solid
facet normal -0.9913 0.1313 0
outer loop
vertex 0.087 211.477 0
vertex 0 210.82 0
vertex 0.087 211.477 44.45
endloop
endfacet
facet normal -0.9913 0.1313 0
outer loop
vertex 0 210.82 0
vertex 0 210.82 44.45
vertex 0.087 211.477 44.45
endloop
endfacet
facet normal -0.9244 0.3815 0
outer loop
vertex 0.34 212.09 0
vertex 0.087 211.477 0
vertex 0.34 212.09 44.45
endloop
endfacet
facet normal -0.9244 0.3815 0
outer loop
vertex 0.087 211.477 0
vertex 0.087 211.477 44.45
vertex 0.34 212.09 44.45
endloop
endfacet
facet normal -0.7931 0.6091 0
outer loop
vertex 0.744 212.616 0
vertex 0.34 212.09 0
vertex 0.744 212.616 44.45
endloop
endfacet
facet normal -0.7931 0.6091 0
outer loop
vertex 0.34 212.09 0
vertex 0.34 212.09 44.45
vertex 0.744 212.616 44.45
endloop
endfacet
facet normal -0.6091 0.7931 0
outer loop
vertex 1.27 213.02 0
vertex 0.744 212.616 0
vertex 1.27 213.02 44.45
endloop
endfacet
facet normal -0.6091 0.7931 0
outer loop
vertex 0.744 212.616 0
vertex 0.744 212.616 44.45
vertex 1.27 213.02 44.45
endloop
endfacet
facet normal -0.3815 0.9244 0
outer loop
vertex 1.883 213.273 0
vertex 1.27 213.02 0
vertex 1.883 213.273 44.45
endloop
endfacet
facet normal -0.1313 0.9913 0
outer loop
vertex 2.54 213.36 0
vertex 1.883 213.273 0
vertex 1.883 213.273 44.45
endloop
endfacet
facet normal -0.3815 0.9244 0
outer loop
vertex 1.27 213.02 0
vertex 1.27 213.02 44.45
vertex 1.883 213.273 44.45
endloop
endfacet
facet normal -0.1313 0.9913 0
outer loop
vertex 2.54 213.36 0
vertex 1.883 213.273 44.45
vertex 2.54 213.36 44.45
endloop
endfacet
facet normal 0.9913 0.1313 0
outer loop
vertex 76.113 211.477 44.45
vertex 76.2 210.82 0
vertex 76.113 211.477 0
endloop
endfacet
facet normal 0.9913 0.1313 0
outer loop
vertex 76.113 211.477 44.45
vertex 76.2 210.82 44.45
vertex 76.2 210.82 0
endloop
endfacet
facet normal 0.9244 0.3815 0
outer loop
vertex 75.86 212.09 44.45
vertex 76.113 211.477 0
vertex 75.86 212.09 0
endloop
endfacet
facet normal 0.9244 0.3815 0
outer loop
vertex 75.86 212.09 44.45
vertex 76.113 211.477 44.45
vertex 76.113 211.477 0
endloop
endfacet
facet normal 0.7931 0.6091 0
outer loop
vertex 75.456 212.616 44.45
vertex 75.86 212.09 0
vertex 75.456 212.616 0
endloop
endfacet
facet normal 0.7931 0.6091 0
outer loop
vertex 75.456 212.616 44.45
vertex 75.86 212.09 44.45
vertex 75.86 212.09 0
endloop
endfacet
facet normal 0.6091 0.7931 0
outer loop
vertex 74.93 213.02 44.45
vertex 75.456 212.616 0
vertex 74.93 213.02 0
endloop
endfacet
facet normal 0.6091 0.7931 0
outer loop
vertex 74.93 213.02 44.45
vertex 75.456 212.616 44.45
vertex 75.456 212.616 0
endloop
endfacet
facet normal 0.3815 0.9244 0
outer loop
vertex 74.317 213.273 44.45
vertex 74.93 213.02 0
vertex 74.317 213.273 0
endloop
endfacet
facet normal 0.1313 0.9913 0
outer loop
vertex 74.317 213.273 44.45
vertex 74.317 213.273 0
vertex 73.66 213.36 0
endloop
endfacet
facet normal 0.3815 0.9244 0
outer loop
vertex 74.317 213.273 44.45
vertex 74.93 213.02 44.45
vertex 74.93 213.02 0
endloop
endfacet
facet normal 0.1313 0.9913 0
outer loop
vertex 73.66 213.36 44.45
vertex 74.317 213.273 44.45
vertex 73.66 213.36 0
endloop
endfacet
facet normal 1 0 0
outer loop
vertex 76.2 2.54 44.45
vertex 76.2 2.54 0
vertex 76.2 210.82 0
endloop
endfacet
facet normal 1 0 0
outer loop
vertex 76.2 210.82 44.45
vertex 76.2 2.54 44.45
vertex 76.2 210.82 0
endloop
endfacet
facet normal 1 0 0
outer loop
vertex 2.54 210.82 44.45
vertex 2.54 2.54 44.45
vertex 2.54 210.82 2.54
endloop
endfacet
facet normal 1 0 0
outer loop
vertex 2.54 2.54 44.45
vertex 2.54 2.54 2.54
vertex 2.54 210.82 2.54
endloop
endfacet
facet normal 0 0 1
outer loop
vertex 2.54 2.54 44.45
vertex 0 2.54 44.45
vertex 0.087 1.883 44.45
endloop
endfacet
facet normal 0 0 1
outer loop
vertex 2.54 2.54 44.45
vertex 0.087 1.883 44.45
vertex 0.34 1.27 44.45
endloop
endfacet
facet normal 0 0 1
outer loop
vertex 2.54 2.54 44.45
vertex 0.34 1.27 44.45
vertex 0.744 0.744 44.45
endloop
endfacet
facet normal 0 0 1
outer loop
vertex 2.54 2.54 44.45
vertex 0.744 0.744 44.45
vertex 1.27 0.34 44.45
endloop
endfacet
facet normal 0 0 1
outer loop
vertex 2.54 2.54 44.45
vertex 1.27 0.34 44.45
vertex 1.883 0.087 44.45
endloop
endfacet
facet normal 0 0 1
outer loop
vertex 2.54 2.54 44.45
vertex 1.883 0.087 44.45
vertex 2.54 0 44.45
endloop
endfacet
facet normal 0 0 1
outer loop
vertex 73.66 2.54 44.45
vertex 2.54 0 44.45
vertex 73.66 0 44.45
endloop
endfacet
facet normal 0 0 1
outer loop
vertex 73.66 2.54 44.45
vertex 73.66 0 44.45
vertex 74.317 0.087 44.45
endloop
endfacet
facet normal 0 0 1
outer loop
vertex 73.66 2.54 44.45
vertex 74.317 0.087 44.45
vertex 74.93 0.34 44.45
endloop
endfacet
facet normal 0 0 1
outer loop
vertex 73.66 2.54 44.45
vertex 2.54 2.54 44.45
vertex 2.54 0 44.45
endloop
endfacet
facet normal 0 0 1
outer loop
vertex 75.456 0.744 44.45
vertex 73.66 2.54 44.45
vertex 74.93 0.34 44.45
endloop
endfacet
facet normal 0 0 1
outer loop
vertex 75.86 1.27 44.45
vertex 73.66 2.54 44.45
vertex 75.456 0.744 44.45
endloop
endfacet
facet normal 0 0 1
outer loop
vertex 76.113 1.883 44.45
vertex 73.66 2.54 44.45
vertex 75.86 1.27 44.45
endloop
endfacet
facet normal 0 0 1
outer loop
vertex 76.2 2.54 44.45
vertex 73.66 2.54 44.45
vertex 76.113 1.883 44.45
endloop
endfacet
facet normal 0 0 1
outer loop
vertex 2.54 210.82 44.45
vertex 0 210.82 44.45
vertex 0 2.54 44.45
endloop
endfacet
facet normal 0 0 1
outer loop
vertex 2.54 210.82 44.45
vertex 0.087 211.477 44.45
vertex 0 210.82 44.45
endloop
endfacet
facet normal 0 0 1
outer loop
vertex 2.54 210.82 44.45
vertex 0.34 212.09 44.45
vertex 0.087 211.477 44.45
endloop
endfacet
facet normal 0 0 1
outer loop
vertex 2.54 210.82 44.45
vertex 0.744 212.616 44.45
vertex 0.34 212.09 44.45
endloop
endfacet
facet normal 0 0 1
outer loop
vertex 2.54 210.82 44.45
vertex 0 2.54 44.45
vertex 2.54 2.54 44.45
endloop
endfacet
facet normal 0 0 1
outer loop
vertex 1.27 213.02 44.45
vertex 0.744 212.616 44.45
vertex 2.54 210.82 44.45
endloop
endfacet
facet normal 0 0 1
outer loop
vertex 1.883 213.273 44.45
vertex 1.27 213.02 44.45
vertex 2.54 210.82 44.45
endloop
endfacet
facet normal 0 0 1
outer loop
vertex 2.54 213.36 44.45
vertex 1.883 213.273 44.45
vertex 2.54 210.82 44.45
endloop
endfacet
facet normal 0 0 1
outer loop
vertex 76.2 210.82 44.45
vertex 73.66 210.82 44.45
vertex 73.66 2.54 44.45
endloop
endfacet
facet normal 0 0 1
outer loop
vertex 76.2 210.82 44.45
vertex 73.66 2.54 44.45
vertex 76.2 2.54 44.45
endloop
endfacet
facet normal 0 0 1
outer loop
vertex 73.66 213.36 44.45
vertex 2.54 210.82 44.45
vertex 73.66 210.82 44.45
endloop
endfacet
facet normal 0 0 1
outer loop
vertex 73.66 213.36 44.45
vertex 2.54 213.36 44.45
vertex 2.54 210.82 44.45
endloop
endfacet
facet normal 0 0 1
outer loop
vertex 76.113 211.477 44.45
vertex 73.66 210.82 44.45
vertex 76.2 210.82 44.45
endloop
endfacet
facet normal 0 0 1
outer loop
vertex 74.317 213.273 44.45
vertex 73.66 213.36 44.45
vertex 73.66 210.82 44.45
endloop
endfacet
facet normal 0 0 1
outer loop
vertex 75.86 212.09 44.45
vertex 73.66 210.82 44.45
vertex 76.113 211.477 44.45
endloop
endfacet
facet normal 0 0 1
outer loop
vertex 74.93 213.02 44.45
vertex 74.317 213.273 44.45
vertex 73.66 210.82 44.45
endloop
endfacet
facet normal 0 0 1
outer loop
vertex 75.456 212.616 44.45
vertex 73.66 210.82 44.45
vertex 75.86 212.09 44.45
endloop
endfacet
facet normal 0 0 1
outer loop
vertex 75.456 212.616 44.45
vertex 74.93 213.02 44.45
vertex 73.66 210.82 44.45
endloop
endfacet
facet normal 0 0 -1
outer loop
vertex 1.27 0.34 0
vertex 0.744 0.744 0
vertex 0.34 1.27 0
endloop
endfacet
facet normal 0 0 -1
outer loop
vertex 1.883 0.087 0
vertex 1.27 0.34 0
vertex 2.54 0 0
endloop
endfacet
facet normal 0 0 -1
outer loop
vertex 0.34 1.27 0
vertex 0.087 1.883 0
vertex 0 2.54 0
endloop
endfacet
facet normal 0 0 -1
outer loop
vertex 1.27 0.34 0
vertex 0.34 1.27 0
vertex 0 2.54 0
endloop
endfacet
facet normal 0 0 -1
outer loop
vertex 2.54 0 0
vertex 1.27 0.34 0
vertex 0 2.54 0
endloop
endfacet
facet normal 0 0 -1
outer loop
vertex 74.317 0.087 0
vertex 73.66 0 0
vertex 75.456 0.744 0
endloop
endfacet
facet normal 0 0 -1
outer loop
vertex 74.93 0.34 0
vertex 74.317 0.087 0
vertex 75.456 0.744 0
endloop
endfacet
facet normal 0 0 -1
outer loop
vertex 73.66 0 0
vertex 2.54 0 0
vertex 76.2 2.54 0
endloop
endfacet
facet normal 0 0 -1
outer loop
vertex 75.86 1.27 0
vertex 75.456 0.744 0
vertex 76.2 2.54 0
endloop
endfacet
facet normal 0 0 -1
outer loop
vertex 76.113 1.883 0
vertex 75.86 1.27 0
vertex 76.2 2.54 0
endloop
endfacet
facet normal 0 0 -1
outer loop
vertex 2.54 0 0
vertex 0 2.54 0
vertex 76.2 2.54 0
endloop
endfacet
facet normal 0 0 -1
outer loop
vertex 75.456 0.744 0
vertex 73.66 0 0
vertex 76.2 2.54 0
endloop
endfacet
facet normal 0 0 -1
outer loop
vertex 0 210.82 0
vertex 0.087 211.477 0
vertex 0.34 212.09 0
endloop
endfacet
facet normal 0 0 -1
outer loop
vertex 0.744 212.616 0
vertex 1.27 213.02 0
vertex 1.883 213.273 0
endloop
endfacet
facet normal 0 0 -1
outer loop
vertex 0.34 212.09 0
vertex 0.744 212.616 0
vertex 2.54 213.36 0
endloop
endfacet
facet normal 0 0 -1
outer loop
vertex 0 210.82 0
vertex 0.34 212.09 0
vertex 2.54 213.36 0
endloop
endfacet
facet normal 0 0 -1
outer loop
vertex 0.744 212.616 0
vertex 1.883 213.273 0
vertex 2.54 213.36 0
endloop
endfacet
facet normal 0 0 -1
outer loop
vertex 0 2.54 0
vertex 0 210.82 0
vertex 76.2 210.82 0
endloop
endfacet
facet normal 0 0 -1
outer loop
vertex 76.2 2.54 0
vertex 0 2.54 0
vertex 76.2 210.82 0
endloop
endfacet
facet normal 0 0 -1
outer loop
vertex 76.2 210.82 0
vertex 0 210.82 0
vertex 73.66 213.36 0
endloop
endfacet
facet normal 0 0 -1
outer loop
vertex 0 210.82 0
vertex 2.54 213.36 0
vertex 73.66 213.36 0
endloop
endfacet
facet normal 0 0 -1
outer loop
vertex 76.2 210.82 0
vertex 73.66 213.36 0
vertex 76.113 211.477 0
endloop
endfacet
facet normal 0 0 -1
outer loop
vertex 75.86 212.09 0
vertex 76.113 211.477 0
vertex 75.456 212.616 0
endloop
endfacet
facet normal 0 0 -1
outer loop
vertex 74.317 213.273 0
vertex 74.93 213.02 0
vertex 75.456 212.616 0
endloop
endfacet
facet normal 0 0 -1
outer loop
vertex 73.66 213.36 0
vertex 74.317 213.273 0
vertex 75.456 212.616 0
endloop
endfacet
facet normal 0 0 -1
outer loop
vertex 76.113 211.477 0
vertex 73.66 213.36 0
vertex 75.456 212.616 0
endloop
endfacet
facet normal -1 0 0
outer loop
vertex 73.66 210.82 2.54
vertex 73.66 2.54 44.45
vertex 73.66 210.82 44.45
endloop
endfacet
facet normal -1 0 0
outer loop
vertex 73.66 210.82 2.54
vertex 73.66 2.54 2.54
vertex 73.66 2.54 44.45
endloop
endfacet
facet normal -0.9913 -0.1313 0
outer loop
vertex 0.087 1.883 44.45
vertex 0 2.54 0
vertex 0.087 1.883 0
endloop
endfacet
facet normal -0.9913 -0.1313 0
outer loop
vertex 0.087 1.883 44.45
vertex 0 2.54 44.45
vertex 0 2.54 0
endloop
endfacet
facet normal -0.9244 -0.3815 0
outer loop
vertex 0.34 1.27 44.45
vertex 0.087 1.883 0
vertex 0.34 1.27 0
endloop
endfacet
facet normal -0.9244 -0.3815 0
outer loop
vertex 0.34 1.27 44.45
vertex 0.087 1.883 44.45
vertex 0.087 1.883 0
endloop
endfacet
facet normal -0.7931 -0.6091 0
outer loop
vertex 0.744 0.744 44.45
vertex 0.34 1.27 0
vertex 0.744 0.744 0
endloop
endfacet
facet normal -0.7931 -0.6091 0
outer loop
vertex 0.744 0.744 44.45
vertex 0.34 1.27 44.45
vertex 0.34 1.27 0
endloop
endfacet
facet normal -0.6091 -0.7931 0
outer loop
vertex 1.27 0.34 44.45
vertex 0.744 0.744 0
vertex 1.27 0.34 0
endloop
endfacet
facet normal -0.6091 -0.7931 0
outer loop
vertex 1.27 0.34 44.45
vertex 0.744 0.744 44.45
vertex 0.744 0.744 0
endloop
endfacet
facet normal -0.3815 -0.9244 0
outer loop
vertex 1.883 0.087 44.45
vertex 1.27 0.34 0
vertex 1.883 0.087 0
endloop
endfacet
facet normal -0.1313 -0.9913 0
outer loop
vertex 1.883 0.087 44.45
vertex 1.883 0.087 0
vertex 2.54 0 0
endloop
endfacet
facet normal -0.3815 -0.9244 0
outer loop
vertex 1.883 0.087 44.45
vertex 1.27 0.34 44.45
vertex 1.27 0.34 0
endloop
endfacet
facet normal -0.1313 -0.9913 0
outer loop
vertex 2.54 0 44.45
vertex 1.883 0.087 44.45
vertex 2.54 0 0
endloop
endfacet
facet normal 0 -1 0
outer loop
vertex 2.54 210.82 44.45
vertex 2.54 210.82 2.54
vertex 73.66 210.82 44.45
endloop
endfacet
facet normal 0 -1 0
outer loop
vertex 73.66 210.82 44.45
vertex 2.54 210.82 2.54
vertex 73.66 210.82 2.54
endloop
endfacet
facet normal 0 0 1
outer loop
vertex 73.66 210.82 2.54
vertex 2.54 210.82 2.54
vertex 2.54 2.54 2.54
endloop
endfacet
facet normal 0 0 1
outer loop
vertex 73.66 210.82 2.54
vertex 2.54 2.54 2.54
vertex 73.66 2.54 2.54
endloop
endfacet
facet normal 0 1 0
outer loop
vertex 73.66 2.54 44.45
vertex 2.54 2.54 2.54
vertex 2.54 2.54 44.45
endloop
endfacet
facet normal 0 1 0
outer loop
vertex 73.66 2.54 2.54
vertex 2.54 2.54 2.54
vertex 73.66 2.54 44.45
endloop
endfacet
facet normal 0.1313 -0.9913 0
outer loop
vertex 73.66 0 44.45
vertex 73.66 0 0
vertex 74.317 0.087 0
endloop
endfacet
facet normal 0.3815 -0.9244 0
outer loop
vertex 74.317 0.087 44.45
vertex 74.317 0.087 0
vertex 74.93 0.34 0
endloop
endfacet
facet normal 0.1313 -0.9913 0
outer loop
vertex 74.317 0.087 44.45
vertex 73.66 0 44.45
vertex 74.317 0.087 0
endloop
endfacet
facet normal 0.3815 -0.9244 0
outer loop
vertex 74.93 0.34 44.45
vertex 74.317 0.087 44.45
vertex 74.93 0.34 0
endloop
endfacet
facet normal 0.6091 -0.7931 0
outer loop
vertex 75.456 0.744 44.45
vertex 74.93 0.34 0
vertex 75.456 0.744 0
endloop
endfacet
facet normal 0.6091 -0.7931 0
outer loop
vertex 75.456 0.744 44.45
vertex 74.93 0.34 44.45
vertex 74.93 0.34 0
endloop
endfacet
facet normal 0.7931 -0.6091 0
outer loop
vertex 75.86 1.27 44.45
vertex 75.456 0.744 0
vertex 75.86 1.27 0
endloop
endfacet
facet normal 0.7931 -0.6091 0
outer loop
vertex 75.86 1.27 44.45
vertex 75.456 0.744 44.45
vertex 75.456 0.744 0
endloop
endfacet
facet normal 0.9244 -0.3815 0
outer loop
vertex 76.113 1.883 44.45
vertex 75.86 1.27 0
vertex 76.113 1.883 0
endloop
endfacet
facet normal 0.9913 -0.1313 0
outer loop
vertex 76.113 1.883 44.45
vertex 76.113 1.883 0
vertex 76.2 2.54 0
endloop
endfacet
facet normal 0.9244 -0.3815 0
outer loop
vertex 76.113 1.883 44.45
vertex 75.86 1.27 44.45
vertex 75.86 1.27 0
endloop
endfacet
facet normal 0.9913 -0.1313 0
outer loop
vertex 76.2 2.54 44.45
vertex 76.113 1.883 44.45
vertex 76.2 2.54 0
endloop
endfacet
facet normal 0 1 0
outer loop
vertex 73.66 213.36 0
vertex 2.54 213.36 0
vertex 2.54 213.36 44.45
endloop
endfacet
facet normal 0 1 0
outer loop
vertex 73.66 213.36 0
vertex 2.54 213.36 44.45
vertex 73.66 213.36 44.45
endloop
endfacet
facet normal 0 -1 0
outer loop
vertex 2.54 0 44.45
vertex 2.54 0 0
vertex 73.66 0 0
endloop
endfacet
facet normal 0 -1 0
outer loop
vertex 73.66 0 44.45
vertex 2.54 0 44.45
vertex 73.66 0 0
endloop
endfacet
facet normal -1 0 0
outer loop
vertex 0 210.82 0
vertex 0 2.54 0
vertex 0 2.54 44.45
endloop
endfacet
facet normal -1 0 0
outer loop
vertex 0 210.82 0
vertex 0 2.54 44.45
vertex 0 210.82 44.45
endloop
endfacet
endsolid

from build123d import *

# Parameters (mm, degrees)
F0_W     = 76.2
F0_H     = 213.36
F1_DEPTH = 44.45
F2_T     = -2.54
F3_R     = 2.54


with BuildPart() as f1:
    # F0 (on Top) → F1 (new body)
    with BuildSketch(Plane.XY):
        with Locations((38.1, 106.68)):
            Rectangle(F0_W, F0_H)
    extrude(amount=F1_DEPTH)

    # F2
    f2_openings = [f1.faces().sort_by_distance(p)[0] for p in [
        (38.1, 106.68, 44.45),
    ]]
    offset(amount=F2_T, openings=f2_openings)

    # F3
    f3_edges = [f1.edges().sort_by_distance(p)[0] for p in [
        (0, 0, 22.225),
        (76.2, 0, 22.225),
        (76.2, 213.36, 22.225),
        (0, 213.36, 22.225),
    ]]
    fillet(f3_edges, radius=F3_R)


solid = f1.part
